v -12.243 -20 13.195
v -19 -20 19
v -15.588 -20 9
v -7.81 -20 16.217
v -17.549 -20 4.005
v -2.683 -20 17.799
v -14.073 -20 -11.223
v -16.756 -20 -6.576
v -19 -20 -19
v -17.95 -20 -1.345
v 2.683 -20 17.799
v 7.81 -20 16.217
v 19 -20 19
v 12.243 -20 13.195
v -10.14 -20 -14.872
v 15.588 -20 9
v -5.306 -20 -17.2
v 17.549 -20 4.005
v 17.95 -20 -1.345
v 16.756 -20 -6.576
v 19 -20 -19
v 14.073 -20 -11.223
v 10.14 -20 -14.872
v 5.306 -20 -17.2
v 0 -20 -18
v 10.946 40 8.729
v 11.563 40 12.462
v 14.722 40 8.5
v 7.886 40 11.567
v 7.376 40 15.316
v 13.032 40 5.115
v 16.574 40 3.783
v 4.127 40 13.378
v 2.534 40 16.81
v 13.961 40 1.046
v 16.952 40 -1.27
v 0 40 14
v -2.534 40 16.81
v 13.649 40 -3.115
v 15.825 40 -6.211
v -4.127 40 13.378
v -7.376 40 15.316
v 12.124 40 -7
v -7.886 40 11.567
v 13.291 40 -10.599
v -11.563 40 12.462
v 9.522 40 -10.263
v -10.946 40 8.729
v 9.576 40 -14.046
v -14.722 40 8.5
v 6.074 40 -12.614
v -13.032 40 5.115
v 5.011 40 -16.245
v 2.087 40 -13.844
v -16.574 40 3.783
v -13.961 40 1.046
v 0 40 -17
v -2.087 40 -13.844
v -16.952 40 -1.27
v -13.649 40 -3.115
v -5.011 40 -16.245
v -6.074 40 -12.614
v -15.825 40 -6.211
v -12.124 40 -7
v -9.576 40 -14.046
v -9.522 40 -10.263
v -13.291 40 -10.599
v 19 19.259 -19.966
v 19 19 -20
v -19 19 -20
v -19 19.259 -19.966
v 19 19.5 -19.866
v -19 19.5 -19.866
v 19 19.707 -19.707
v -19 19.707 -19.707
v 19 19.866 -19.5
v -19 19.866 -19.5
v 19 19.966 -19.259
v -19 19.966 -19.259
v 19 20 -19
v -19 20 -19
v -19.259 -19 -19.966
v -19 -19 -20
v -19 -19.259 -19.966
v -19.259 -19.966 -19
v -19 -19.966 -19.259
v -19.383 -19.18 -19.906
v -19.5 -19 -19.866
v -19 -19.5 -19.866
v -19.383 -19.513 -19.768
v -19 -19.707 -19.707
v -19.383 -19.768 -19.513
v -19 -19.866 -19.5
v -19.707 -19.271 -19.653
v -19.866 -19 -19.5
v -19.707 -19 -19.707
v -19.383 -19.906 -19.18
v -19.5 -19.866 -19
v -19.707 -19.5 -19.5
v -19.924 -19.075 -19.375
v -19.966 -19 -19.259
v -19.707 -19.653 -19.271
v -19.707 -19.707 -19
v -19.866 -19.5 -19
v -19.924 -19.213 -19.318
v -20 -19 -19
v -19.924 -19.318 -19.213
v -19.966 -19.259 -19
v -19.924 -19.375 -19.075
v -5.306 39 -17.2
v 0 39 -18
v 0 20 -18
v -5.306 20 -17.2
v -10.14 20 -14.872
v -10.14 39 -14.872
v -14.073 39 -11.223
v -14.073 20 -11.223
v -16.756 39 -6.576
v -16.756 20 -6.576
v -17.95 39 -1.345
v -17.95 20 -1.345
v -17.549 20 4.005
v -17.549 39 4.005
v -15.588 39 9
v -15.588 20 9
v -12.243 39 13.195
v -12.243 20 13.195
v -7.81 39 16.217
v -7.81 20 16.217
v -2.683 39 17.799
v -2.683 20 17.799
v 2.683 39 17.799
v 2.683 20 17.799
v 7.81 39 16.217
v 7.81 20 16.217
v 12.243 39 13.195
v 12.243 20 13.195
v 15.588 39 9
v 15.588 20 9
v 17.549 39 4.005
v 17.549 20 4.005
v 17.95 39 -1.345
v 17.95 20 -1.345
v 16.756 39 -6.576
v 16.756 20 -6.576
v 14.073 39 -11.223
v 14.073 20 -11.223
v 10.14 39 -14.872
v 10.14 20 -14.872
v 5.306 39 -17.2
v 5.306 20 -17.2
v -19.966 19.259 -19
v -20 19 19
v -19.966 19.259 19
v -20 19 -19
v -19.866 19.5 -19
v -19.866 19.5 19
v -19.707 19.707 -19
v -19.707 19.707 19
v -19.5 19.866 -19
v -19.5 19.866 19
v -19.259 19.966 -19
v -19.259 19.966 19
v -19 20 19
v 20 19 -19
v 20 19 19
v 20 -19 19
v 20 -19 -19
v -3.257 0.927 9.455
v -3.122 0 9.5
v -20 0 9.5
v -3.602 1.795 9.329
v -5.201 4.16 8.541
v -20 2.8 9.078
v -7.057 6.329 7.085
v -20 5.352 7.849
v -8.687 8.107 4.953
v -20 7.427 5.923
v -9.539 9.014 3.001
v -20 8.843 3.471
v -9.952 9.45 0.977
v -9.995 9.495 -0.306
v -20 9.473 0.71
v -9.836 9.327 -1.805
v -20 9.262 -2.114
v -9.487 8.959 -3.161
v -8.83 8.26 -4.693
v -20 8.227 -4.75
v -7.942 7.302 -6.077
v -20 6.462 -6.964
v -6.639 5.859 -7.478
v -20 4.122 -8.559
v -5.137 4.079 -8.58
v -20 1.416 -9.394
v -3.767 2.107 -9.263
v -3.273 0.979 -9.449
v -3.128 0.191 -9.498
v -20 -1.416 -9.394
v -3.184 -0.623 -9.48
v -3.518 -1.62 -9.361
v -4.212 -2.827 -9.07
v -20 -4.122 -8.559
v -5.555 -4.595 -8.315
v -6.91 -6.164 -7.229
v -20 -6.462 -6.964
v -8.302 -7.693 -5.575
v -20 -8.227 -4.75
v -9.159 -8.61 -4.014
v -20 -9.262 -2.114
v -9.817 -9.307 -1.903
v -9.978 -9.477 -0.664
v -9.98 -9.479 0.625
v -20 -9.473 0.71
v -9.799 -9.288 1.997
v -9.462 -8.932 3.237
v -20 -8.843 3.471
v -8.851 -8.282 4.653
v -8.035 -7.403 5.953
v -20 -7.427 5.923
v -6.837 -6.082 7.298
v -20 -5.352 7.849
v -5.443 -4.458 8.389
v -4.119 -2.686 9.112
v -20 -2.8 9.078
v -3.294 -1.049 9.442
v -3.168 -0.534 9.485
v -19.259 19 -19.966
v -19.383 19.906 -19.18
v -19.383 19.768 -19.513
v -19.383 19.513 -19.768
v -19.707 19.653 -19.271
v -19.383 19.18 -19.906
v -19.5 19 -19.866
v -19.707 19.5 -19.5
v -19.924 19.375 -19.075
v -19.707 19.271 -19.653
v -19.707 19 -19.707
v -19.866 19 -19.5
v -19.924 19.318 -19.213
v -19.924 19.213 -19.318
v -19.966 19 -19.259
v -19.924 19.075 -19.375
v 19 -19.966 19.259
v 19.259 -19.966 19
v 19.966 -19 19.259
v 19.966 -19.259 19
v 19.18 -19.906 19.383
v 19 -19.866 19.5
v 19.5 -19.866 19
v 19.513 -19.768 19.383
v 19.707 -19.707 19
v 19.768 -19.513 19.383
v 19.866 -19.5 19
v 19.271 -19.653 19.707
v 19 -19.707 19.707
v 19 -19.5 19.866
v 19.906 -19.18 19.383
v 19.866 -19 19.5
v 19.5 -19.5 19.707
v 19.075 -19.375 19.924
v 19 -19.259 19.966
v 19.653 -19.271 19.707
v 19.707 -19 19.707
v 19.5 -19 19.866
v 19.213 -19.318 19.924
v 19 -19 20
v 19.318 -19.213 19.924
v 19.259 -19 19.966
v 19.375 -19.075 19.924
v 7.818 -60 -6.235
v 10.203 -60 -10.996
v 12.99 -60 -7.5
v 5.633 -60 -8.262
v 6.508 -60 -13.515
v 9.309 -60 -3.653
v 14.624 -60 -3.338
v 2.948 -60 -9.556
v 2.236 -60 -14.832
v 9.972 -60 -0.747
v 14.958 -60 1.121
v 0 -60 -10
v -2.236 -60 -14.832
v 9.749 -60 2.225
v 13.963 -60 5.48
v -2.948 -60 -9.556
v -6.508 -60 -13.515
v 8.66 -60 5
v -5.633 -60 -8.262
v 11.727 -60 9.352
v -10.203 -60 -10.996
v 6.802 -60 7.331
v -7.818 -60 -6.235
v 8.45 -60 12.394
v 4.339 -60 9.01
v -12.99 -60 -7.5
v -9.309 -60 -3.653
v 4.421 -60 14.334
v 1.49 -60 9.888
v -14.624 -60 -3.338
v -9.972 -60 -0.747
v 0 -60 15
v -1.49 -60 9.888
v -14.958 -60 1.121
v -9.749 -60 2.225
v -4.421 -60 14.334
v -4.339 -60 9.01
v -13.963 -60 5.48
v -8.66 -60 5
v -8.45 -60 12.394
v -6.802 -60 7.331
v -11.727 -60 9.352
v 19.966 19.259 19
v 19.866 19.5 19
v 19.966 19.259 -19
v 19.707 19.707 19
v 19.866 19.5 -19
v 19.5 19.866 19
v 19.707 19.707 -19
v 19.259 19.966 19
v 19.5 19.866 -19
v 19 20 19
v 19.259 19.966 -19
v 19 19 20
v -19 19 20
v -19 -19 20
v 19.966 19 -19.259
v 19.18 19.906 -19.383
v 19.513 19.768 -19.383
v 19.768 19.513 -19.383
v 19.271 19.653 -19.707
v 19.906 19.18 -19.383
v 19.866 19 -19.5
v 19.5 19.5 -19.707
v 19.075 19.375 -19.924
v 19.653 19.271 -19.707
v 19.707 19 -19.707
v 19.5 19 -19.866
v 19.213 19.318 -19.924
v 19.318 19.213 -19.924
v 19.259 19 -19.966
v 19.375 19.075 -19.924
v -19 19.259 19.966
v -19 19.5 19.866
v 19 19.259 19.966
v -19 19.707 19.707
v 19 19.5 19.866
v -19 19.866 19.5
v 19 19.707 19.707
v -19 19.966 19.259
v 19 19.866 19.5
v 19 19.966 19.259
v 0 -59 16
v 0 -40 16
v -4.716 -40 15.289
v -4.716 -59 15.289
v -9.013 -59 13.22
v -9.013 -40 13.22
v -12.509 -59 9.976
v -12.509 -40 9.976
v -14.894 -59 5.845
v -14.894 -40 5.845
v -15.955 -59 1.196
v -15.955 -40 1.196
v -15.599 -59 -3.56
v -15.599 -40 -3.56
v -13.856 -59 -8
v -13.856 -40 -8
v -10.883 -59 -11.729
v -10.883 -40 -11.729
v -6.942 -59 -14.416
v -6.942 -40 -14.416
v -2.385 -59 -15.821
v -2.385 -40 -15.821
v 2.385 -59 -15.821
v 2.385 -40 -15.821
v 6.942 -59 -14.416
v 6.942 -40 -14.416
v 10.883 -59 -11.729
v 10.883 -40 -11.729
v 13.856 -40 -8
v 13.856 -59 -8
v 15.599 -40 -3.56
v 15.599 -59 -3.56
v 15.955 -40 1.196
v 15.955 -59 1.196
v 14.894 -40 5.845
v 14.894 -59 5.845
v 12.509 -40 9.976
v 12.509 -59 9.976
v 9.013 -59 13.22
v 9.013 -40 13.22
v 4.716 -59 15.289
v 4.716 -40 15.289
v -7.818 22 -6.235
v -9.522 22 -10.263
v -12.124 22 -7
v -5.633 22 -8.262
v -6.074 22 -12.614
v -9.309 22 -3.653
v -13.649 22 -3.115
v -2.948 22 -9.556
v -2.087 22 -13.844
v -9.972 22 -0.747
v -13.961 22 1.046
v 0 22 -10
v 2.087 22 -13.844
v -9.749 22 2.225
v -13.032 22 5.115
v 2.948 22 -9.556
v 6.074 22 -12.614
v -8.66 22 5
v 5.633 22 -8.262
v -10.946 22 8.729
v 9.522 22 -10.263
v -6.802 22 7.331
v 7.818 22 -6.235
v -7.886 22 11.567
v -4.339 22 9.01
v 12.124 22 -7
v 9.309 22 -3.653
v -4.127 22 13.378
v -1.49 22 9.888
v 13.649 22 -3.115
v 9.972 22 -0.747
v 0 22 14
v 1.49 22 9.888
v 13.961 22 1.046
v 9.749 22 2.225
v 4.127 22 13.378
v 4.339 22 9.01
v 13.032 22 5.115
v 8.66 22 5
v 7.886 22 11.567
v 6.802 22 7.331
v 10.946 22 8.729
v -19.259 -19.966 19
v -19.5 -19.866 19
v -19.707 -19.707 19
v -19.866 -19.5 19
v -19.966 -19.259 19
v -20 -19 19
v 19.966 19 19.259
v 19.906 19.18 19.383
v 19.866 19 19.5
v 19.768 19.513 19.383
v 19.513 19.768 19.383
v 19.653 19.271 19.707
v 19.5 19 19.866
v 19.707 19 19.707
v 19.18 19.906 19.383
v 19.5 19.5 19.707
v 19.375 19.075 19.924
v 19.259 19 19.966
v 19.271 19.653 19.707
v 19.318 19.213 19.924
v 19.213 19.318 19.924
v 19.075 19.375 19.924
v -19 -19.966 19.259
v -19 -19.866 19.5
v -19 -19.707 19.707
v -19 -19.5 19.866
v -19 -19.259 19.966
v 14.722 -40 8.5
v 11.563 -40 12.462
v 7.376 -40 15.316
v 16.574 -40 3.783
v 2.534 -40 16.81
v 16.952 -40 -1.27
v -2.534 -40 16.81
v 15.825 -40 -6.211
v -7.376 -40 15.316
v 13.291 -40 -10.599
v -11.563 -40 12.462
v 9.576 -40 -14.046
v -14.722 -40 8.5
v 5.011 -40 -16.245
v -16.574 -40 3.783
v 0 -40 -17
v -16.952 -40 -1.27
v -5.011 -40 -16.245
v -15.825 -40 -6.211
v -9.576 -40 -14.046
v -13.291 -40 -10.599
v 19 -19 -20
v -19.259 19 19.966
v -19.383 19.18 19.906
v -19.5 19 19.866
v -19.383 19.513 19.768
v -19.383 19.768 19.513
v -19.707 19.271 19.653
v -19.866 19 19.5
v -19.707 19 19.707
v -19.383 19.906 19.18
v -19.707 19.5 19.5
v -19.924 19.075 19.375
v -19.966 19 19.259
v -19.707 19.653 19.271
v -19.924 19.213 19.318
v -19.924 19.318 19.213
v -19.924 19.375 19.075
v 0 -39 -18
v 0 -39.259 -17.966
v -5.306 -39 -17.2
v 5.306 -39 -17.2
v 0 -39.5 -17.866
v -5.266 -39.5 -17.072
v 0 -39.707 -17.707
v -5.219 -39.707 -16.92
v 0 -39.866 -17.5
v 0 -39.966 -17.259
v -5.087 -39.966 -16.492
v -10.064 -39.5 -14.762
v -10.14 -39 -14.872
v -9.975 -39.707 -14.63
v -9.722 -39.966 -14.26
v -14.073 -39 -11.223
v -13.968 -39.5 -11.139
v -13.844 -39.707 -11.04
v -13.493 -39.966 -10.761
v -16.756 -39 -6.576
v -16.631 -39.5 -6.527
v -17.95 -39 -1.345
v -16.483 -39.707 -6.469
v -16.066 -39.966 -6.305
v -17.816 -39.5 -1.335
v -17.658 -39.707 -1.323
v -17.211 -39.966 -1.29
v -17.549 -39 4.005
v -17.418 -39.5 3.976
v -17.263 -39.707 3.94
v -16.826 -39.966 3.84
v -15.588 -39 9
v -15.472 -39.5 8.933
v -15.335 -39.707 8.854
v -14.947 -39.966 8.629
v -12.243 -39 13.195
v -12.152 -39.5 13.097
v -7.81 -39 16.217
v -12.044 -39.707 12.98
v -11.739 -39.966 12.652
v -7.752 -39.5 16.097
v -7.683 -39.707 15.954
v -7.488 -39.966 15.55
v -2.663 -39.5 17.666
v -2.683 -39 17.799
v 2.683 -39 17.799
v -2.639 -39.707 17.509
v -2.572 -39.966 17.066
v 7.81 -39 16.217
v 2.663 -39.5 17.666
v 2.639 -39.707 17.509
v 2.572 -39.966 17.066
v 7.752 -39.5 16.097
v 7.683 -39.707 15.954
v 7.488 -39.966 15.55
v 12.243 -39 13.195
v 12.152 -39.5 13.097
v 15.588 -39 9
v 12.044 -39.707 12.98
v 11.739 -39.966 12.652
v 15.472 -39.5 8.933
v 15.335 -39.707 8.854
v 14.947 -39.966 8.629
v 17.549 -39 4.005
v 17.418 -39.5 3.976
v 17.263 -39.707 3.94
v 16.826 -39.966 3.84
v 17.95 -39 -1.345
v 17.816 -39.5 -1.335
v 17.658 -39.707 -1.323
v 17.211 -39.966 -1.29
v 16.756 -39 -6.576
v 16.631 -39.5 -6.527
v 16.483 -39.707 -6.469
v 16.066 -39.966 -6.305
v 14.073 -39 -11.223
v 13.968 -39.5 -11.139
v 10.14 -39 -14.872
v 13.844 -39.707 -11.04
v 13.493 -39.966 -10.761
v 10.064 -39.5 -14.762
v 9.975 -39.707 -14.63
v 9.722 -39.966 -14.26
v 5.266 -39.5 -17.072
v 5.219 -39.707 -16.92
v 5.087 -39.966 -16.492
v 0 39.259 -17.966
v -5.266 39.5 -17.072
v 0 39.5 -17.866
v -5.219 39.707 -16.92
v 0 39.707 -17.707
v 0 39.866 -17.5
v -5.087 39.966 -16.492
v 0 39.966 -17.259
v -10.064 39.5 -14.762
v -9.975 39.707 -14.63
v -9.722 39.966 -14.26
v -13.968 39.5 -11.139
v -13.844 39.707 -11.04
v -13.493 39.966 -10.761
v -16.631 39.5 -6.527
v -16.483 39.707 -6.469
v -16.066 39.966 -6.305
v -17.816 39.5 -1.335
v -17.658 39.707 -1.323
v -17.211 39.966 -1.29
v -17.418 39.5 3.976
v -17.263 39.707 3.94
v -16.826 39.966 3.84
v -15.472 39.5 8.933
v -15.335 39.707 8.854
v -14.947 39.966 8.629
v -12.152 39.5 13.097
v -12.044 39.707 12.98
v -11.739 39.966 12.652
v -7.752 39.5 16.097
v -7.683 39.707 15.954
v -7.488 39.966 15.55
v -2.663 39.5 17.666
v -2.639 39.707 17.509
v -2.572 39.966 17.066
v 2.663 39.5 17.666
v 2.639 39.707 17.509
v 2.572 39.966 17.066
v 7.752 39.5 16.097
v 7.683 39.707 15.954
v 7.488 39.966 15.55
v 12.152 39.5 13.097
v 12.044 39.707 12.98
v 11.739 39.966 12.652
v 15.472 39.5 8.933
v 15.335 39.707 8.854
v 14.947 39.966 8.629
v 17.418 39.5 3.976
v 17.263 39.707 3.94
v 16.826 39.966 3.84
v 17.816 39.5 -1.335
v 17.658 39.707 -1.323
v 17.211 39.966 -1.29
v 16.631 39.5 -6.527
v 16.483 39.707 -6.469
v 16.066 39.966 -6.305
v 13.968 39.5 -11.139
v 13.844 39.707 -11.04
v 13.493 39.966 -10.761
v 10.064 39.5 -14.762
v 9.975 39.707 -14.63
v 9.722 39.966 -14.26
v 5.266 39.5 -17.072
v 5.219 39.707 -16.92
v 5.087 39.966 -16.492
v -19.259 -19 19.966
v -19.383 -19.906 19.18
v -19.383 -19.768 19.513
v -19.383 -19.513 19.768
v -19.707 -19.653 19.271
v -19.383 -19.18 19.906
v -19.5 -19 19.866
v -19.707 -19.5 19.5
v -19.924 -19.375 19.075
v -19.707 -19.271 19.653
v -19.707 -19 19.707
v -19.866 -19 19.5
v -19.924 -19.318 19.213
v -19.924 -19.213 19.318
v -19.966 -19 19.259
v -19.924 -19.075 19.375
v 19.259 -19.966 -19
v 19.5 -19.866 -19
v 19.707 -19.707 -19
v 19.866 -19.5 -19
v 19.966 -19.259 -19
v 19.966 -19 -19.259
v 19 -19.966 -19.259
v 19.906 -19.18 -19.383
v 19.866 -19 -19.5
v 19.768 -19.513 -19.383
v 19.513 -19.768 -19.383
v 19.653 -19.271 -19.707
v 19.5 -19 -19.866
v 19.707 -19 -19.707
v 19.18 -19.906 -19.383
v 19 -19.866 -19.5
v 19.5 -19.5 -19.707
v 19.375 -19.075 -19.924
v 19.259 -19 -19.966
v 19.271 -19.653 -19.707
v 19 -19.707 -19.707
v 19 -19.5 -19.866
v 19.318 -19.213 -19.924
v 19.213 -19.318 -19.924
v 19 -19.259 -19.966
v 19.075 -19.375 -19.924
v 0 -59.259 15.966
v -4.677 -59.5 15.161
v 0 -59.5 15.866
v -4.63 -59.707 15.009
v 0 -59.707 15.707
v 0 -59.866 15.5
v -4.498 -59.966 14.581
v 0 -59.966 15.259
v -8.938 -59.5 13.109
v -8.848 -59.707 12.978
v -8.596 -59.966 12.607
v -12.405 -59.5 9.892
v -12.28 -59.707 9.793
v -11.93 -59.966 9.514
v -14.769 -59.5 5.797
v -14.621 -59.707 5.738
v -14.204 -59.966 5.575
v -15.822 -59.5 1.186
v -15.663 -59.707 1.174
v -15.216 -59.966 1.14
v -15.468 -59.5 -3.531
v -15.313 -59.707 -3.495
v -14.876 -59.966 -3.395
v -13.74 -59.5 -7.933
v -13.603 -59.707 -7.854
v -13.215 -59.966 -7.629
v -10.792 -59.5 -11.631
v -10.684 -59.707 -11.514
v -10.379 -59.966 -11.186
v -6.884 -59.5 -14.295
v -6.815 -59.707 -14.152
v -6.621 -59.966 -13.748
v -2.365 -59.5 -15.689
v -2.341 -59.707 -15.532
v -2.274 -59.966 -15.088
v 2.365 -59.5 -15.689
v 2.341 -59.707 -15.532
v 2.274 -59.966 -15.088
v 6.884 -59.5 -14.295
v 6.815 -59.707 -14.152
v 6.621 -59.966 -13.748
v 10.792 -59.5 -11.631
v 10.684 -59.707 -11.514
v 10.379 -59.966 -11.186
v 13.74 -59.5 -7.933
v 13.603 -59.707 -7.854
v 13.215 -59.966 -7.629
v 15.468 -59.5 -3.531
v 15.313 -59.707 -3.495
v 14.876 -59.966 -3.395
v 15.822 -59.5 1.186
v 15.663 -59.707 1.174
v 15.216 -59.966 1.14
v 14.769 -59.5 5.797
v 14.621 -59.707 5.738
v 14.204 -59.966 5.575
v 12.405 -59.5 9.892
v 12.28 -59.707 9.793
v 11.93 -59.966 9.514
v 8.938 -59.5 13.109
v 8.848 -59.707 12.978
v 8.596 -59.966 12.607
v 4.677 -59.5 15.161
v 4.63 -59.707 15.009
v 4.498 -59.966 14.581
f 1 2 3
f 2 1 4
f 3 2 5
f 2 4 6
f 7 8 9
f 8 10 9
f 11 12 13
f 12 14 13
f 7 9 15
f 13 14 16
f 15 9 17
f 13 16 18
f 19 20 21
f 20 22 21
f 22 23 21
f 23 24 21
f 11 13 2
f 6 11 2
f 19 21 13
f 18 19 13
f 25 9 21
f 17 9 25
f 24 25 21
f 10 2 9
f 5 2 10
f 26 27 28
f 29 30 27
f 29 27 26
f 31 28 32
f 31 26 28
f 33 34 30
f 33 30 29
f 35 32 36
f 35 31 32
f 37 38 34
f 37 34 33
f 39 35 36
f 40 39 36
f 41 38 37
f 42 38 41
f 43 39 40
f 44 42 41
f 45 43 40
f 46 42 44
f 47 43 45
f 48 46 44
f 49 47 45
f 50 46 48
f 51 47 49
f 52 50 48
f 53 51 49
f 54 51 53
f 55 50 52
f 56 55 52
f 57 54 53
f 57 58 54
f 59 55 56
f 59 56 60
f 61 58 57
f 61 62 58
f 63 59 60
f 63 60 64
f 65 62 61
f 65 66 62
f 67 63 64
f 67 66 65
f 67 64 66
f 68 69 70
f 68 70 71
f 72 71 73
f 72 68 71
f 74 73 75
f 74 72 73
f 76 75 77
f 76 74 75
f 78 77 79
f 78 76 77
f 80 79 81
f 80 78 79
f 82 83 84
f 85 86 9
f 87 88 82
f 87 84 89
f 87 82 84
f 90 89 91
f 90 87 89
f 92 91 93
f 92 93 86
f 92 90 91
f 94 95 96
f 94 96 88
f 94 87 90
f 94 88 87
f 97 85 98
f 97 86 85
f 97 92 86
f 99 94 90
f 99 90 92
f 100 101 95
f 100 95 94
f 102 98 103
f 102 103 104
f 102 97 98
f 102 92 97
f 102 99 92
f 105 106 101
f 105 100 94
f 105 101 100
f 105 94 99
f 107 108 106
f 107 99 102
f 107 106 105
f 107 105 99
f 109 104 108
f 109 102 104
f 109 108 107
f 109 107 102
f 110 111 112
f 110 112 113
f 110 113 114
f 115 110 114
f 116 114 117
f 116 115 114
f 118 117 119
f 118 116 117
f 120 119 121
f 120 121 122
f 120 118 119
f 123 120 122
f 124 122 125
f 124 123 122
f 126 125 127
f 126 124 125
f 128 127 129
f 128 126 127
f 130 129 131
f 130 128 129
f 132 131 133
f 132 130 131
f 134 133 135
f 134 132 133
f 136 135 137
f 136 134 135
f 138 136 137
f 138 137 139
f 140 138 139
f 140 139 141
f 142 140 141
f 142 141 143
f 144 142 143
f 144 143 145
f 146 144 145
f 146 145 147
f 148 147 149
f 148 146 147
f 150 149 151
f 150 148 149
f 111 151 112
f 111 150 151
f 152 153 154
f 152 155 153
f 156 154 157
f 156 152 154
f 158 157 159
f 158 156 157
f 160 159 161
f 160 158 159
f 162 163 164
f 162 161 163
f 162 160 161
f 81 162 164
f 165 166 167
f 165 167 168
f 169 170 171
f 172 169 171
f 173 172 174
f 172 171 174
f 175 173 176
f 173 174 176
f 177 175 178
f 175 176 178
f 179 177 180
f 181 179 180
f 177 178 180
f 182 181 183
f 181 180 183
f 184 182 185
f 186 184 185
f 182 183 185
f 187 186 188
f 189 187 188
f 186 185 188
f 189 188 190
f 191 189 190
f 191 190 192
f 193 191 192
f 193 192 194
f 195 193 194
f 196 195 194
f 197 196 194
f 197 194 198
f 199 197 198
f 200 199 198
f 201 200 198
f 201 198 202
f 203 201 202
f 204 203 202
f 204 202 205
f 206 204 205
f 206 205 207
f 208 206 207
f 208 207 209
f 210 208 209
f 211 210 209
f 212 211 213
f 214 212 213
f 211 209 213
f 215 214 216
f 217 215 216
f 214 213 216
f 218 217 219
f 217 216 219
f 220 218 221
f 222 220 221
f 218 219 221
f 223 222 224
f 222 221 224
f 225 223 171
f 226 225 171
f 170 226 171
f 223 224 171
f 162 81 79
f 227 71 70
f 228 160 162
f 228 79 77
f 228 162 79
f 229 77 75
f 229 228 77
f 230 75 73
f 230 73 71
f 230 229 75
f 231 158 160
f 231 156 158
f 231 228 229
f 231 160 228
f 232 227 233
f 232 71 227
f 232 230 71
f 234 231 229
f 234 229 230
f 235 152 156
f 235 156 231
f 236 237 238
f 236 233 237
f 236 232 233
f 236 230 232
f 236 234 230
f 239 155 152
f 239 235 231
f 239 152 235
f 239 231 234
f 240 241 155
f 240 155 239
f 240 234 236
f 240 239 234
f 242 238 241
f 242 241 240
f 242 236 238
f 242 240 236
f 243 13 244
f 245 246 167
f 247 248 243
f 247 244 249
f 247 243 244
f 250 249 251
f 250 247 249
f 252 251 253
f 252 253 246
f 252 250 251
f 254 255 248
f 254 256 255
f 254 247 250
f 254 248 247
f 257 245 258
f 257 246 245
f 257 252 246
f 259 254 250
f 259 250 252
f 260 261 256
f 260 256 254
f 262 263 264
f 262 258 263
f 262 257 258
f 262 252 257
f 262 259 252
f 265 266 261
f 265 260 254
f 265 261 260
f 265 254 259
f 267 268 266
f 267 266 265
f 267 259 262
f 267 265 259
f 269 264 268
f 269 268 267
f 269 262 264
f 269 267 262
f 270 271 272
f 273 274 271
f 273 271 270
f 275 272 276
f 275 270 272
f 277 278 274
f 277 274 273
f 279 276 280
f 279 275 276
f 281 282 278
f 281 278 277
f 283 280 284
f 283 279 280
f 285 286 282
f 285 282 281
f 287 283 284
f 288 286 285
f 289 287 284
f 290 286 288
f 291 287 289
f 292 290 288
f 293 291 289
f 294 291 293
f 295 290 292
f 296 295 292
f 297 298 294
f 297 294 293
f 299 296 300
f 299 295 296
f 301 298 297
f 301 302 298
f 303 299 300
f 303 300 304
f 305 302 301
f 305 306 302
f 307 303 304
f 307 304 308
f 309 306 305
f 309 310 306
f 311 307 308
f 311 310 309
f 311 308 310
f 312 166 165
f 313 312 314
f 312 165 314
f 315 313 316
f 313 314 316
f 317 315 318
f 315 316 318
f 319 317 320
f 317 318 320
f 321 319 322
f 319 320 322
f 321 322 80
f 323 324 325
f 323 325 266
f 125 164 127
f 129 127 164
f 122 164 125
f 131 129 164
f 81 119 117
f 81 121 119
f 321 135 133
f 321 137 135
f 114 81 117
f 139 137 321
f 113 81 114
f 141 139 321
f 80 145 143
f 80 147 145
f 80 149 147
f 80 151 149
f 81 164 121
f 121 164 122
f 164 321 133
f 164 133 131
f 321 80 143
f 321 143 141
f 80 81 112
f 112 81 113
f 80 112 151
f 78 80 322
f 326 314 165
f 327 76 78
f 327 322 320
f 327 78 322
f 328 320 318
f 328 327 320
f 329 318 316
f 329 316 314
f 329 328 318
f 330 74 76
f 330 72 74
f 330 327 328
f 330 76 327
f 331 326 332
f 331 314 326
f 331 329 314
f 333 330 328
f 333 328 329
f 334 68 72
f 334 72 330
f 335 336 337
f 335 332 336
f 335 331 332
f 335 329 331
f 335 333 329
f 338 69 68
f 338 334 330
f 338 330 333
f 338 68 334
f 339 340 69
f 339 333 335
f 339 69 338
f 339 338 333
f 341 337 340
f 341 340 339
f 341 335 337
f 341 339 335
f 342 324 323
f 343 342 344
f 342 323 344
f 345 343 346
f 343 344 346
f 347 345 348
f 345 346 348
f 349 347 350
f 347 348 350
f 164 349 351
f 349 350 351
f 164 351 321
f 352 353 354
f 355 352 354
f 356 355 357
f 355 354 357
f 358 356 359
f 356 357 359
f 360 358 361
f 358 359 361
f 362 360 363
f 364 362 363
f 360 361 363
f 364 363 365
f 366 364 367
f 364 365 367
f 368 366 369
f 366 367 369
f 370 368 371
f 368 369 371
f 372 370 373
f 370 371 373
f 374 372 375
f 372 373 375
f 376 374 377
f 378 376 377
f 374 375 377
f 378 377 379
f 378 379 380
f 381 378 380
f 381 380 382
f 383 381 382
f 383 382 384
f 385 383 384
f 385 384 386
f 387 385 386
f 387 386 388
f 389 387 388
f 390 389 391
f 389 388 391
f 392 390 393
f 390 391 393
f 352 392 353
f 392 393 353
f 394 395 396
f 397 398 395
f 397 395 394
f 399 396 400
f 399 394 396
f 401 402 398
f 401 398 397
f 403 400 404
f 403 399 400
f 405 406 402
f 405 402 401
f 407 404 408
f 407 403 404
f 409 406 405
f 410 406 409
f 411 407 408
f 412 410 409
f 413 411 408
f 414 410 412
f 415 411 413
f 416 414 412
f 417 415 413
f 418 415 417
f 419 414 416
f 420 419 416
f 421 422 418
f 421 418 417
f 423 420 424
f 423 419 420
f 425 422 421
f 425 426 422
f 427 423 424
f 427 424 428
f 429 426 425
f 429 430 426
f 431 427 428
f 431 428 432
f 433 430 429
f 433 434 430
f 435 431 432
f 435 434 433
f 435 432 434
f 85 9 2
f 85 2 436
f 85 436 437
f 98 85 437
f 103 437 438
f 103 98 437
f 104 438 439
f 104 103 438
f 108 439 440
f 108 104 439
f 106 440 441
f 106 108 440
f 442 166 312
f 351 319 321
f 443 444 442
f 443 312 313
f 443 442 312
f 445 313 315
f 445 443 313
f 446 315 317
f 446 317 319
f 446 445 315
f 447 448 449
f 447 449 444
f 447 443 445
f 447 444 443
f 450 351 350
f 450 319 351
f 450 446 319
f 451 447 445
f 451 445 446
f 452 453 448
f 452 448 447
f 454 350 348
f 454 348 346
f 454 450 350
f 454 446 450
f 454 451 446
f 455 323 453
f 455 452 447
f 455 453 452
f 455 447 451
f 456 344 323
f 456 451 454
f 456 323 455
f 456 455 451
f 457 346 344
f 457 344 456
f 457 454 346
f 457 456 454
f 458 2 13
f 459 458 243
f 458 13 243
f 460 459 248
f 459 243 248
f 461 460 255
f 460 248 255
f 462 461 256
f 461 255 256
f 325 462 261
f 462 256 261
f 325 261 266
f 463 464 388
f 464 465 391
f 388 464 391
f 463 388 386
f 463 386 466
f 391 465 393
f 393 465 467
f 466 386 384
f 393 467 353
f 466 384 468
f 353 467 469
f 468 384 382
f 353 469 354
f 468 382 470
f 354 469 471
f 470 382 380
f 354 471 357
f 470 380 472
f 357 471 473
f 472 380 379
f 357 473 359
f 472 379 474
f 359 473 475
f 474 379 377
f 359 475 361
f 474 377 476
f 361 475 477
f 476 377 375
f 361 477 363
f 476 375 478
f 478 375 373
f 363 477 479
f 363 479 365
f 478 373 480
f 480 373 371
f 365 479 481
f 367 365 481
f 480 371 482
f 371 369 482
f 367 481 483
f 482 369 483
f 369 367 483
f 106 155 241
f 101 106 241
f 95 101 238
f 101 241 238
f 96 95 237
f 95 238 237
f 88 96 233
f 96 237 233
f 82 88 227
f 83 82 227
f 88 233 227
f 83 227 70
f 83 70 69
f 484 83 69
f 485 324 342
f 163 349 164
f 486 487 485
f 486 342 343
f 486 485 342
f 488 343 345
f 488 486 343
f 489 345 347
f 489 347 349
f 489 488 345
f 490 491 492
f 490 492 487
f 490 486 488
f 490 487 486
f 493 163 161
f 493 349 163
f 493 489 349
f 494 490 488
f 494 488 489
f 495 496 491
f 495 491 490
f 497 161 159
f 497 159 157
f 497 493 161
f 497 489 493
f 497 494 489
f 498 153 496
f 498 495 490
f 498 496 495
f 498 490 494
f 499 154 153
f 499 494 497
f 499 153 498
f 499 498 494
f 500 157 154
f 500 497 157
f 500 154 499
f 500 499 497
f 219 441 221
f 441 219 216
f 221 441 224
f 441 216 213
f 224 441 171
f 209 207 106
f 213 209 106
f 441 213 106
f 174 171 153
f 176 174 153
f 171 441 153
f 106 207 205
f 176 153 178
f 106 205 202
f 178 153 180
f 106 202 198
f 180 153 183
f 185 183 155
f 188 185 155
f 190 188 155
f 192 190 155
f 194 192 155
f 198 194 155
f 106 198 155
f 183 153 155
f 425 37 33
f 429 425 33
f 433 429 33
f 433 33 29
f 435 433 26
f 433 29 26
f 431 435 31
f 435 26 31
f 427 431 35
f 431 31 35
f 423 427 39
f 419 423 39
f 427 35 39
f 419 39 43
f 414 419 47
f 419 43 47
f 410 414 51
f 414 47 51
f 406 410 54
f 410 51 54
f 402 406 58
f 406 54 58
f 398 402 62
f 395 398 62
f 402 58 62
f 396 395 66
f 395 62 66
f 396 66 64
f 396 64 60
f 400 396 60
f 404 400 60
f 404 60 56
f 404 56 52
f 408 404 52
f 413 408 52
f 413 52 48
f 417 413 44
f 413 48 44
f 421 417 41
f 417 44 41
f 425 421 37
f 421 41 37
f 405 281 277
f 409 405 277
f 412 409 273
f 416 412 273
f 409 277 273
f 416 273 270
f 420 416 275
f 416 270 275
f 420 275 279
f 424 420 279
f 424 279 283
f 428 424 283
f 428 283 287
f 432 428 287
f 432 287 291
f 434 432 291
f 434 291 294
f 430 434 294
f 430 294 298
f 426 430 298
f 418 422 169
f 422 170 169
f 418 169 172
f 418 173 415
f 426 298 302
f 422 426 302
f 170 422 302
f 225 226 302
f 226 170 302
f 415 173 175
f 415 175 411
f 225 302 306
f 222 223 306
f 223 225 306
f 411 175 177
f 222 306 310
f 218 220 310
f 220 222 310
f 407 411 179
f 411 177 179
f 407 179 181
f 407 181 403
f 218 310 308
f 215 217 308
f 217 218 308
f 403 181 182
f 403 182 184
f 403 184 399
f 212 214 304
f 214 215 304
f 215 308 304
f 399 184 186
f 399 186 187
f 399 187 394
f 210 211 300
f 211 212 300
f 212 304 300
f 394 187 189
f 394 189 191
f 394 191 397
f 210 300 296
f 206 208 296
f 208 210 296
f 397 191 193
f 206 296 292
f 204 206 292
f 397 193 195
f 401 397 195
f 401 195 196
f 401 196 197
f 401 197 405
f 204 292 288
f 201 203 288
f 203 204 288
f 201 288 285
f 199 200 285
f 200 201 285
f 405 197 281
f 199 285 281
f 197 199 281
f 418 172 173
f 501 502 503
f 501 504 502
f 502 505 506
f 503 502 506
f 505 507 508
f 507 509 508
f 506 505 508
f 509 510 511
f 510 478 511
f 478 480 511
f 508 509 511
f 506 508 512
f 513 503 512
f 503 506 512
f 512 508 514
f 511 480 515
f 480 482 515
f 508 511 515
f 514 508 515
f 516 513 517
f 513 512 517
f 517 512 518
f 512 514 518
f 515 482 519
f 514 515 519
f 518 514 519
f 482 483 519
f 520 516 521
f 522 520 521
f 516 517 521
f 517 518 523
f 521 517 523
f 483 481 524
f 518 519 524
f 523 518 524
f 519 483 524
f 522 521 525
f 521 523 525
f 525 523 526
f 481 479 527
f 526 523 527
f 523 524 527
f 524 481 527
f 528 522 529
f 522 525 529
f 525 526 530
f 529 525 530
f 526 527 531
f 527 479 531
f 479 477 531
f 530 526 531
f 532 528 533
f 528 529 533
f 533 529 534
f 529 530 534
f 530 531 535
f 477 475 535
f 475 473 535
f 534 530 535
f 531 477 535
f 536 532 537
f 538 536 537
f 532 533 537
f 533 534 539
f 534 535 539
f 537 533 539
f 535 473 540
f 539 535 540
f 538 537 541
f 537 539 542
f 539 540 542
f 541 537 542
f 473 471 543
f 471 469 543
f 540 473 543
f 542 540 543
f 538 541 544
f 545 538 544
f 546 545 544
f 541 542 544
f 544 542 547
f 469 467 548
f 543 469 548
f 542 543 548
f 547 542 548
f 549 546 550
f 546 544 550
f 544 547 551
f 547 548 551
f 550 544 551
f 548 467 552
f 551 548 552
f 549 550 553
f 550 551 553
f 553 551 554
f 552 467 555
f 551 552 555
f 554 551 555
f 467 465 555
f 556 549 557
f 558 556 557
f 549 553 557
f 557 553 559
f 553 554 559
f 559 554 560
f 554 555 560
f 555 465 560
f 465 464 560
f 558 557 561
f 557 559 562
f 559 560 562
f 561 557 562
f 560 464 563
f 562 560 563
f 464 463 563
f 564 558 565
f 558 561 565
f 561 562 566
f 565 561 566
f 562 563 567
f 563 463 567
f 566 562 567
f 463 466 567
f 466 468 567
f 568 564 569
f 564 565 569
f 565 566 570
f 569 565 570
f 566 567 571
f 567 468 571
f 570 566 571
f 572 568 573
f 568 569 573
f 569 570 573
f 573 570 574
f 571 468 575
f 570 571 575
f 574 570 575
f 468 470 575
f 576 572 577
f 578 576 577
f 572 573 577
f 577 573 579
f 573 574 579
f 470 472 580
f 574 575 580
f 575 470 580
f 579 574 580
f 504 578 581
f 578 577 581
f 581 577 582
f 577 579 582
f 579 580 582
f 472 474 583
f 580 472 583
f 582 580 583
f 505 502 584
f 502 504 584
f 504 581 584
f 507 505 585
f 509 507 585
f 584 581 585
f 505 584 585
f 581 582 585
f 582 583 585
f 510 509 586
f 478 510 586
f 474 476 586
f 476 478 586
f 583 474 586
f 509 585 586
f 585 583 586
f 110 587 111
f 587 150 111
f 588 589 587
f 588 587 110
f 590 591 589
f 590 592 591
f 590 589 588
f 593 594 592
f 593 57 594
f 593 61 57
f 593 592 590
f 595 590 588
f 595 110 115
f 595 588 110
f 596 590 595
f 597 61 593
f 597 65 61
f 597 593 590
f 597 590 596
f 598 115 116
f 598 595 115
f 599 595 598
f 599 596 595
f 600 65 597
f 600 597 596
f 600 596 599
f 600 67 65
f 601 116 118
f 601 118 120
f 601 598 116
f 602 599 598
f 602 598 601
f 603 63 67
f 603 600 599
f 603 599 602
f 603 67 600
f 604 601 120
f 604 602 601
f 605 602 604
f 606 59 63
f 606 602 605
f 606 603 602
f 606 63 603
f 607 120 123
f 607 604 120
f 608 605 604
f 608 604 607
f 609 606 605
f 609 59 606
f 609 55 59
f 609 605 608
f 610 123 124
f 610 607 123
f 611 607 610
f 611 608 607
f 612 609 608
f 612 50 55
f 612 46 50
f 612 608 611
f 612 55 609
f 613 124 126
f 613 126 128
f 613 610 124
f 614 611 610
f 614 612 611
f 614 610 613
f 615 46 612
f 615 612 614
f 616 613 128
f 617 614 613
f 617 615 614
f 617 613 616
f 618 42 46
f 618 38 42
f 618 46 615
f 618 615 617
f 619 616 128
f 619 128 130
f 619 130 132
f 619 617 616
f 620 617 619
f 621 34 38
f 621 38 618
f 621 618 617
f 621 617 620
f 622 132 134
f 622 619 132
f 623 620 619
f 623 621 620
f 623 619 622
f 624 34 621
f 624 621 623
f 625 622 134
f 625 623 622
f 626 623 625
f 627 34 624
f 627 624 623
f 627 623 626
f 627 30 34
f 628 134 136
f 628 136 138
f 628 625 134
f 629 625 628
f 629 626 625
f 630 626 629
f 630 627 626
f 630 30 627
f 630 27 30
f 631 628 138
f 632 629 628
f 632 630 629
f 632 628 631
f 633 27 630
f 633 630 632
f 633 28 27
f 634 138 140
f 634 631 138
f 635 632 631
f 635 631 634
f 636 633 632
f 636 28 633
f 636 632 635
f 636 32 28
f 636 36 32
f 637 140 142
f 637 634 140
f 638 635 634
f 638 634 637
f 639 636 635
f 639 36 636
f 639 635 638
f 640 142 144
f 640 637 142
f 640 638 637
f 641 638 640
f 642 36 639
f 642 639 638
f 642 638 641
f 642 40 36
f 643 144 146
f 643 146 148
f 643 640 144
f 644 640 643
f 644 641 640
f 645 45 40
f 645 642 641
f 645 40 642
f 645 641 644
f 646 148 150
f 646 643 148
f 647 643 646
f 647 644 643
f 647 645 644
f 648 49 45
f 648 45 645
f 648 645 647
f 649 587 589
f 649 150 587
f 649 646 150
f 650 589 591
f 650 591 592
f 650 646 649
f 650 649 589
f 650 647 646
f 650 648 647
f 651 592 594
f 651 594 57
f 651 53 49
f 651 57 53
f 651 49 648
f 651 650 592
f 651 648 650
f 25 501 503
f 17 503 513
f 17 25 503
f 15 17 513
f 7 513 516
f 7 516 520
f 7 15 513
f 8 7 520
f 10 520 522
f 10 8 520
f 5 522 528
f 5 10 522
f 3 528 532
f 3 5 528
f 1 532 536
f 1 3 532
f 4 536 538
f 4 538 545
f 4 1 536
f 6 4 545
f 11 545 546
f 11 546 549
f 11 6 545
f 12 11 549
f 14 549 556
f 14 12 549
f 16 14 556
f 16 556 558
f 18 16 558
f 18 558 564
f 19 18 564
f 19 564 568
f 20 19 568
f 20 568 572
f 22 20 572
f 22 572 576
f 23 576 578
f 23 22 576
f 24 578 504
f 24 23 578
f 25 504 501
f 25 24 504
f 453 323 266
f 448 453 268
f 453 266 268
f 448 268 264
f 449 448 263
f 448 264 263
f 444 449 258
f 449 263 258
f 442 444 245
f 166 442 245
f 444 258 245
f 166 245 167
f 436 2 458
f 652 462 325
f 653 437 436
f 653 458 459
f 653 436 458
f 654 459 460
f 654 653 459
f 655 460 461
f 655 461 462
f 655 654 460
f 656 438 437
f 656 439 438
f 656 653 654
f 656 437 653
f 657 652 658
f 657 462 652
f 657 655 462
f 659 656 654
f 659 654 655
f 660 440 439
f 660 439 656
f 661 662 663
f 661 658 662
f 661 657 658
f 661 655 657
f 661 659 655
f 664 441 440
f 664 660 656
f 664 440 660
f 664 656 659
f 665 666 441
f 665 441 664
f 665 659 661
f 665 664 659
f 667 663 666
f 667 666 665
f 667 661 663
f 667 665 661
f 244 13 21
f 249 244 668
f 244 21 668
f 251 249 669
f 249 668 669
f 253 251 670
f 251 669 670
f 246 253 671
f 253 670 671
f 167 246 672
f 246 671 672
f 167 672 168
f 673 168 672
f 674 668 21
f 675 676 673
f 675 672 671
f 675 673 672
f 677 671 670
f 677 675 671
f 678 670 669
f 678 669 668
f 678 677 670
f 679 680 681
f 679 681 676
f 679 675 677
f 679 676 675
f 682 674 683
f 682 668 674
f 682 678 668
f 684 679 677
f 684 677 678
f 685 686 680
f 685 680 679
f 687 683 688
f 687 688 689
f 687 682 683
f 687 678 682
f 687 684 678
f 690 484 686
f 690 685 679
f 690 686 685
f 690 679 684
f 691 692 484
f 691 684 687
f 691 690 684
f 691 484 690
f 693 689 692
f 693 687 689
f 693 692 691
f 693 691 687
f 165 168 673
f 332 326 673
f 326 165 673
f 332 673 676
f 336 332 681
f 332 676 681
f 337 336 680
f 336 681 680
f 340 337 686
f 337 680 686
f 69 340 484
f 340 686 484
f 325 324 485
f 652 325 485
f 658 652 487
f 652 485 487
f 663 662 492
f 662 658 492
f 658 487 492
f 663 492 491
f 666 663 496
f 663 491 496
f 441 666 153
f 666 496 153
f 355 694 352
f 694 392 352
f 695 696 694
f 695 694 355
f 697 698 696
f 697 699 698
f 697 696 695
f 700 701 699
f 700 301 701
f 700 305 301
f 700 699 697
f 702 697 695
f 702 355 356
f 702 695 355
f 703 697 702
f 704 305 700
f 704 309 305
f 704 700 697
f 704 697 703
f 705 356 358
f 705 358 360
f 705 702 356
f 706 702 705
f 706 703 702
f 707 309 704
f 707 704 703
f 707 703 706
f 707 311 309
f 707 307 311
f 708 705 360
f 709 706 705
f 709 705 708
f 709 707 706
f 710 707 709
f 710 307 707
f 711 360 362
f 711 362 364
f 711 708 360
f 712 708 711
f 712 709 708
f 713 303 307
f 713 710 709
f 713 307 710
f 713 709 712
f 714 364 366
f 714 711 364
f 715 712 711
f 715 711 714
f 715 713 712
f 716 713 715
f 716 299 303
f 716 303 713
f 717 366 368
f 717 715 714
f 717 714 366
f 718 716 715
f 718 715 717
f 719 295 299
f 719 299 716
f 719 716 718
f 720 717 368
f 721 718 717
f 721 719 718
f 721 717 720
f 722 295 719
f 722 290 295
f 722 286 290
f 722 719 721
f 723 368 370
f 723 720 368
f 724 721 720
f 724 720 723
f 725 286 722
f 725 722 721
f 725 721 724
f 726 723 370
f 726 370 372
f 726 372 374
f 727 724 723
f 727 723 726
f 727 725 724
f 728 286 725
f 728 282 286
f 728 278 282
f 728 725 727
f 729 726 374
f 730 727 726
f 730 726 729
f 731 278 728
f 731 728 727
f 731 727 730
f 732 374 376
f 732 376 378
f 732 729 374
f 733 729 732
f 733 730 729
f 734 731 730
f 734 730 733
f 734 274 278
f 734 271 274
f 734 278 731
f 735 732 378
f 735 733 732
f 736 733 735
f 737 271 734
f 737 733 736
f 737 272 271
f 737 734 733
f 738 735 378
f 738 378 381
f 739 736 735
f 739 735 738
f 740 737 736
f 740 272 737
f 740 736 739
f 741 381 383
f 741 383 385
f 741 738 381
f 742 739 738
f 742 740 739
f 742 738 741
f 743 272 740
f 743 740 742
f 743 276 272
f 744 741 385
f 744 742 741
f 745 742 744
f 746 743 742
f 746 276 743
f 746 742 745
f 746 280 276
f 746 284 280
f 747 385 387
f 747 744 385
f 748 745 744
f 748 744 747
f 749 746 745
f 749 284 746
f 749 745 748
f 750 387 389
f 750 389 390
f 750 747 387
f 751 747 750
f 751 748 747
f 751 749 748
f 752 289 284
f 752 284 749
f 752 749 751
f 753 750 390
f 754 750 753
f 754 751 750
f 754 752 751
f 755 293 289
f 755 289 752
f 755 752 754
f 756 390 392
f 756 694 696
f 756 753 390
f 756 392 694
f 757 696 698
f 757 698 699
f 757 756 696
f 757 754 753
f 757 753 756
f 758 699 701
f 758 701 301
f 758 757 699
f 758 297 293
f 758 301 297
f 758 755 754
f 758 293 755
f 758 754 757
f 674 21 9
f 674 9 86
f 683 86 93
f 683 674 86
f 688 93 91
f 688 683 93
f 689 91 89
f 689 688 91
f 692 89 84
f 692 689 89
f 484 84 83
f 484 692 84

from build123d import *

# Parameters (mm, degrees)
CROQUIS1_W              = 40
CROQUIS1_H              = 40
SALIENTE_EXTRUIR2_DEPTH = 20
CROQUIS4_R              = 18
SALIENTE_EXTRUIR3_DEPTH = 40
REDONDEO1_R             = 1
CROQUIS5_R              = 16
SALIENTE_EXTRUIR4_DEPTH = 20
REDONDEO2_R             = 1
CROQUIS6_R              = 14
CORTAR_EXTRUIR1_DEPTH   = 18
CROQUIS7_R              = 10
CORTAR_EXTRUIR3_DEPTH   = 104.923048454
CROQUIS8_R              = 9.5
CORTAR_EXTRUIR4_DEPTH   = 18
REDONDEO3_R             = 1


with BuildPart() as part:
    # Croquis1 → Saliente-Extruir2 (new, symmetric)
    with BuildSketch(Plane(origin=(0, 0, 0), x_dir=(1, 0, 0), z_dir=(0, 1, 0))):
        Rectangle(CROQUIS1_W, CROQUIS1_H)
    extrude(amount=SALIENTE_EXTRUIR2_DEPTH, both=True)

    # Croquis4 → Saliente-Extruir3 (add, symmetric)
    with BuildSketch(Plane(origin=(0, 0, 0), x_dir=(1, 0, 0), z_dir=(0, 1, 0))):
        with Locations(Location((0, 0, 0), (0, 0, 90))):
            Circle(CROQUIS4_R)
    extrude(amount=SALIENTE_EXTRUIR3_DEPTH, both=True)

    # Redondeo1
    redondeo1_edges = [part.edges().sort_by_distance(p)[0] for p in [
        (-20, 20, 0),
        (0, 20, 20),
        (0, -40, 18),
        (0, 40, 18),
        (20, 20, 0),
        (0, -20, 20),
        (-20, -20, 0),
        (0, -20, -20),
        (20, -20, 0),
        (0, 20, -20),
    ]]
    fillet(redondeo1_edges, radius=REDONDEO1_R)

    # Croquis5 → Saliente-Extruir4 (add)
    with BuildSketch(Plane.XZ.offset(40)):
        with Locations(Location((0, 0, 0), (0, 0, 90))):
            Circle(CROQUIS5_R)
    extrude(amount=SALIENTE_EXTRUIR4_DEPTH)

    # Redondeo2
    redondeo2_edges = [part.edges().sort_by_distance(p)[0] for p in [
        (0, -60, -16),
    ]]
    fillet(redondeo2_edges, radius=REDONDEO2_R)

    # Croquis6 → Cortar-Extruir1 (cut)
    with BuildSketch(Plane(origin=(0, 40, 0), x_dir=(1, 0, 0), z_dir=(0, 1, 0))):
        with Locations(Location((0, 0, 0), (0, 0, 270))):
            Circle(CROQUIS6_R)
    extrude(amount=-CORTAR_EXTRUIR1_DEPTH, mode=Mode.SUBTRACT)

    # Croquis7 → Cortar-Extruir3 (cut, through all)
    with BuildSketch(Plane.XZ.offset(60)):
        with Locations(Location((0, 0, 0), (0, 0, 270))):
            Circle(CROQUIS7_R)
    extrude(amount=-CORTAR_EXTRUIR3_DEPTH, mode=Mode.SUBTRACT)

    # Croquis8 → Cortar-Extruir4 (cut)
    with BuildSketch(Plane.ZY.offset(20)):
        Circle(CROQUIS8_R)
    extrude(amount=-CORTAR_EXTRUIR4_DEPTH, mode=Mode.SUBTRACT)

    # Redondeo3
    # the kernel refuses this fillet: 1 mm, written as the material it takes off along each edge
    with BuildSketch(Plane(origin=(19, -19, 19), x_dir=(1, 0, 0), z_dir=(0, 0, 1))) as redondeo3_piece_1_section:
        Polygon((0, 0), (REDONDEO3_R, 0), (REDONDEO3_R, -REDONDEO3_R), (0, -REDONDEO3_R), align=None)
    redondeo3_piece_1 = extrude(amount=REDONDEO3_R, mode=Mode.PRIVATE)
    redondeo3_piece_1 = redondeo3_piece_1 - Plane(origin=(19, -19, 19), x_dir=(-0.7071067811865475, 0.7071067811865475, 0), z_dir=(0, 0, 1)) * Sphere(REDONDEO3_R, mode=Mode.PRIVATE)
    add(redondeo3_piece_1, mode=Mode.SUBTRACT)
    with BuildSketch(Plane(origin=(-19, -19, 19), x_dir=(0, 0, 1), z_dir=(-1, 0, 0))) as redondeo3_piece_2_section:
        Polygon((0, 0), (REDONDEO3_R, 0), (REDONDEO3_R, -REDONDEO3_R), (0, -REDONDEO3_R), align=None)
    redondeo3_piece_2 = extrude(amount=REDONDEO3_R, mode=Mode.PRIVATE)
    redondeo3_piece_2 = redondeo3_piece_2 - Plane(origin=(-19, -19, 19), x_dir=(0, 0.7071067811865475, -0.7071067811865475), z_dir=(-1, 0, 0)) * Sphere(REDONDEO3_R, mode=Mode.PRIVATE)
    add(redondeo3_piece_2, mode=Mode.SUBTRACT)
    with BuildSketch(Plane(origin=(19, -19, -19), x_dir=(1, 0, 0), z_dir=(0, 0, -1))) as redondeo3_piece_3_section:
        Polygon((0, 0), (REDONDEO3_R, 0), (REDONDEO3_R, REDONDEO3_R), (0, REDONDEO3_R), align=None)
    redondeo3_piece_3 = extrude(amount=REDONDEO3_R, mode=Mode.PRIVATE)
    redondeo3_piece_3 = redondeo3_piece_3 - Plane(origin=(19, -19, -19), x_dir=(-0.7071067811865475, 0.7071067811865475, 0), z_dir=(0, 0, -1)) * Sphere(REDONDEO3_R, mode=Mode.PRIVATE)
    add(redondeo3_piece_3, mode=Mode.SUBTRACT)
    with BuildSketch(Plane(origin=(-19, -19, -19), x_dir=(0, 0, -1), z_dir=(-1, 0, 0))) as redondeo3_piece_4_section:
        Polygon((0, 0), (REDONDEO3_R, 0), (REDONDEO3_R, REDONDEO3_R), (0, REDONDEO3_R), align=None)
    redondeo3_piece_4 = extrude(amount=REDONDEO3_R, mode=Mode.PRIVATE)
    redondeo3_piece_4 = redondeo3_piece_4 - Plane(origin=(-19, -19, -19), x_dir=(0, 0.7071067811865475, 0.7071067811865475), z_dir=(-1, 0, 0)) * Sphere(REDONDEO3_R, mode=Mode.PRIVATE)
    add(redondeo3_piece_4, mode=Mode.SUBTRACT)
    with BuildSketch(Plane(origin=(19, 19, 19), x_dir=(1, 0, 0), z_dir=(0, 0, 1))) as redondeo3_piece_5_section:
        Polygon((0, 0), (REDONDEO3_R, 0), (REDONDEO3_R, REDONDEO3_R), (0, REDONDEO3_R), align=None)
    redondeo3_piece_5 = extrude(amount=REDONDEO3_R, mode=Mode.PRIVATE)
    redondeo3_piece_5 = redondeo3_piece_5 - Plane(origin=(19, 19, 19), x_dir=(-0.7071067811865475, -0.7071067811865475, 0), z_dir=(0, 0, 1)) * Sphere(REDONDEO3_R, mode=Mode.PRIVATE)
    add(redondeo3_piece_5, mode=Mode.SUBTRACT)
    with BuildSketch(Plane(origin=(-19, 19, 19), x_dir=(0, 0, 1), z_dir=(-1, 0, 0))) as redondeo3_piece_6_section:
        Polygon((0, 0), (REDONDEO3_R, 0), (REDONDEO3_R, REDONDEO3_R), (0, REDONDEO3_R), align=None)
    redondeo3_piece_6 = extrude(amount=REDONDEO3_R, mode=Mode.PRIVATE)
    redondeo3_piece_6 = redondeo3_piece_6 - Plane(origin=(-19, 19, 19), x_dir=(0, -0.7071067811865475, -0.7071067811865475), z_dir=(-1, 0, 0)) * Sphere(REDONDEO3_R, mode=Mode.PRIVATE)
    add(redondeo3_piece_6, mode=Mode.SUBTRACT)
    with BuildSketch(Plane(origin=(19, 19, -19), x_dir=(1, 0, 0), z_dir=(0, 0, -1))) as redondeo3_piece_7_section:
        Polygon((0, 0), (REDONDEO3_R, 0), (REDONDEO3_R, -REDONDEO3_R), (0, -REDONDEO3_R), align=None)
    redondeo3_piece_7 = extrude(amount=REDONDEO3_R, mode=Mode.PRIVATE)
    redondeo3_piece_7 = redondeo3_piece_7 - Plane(origin=(19, 19, -19), x_dir=(-0.7071067811865475, -0.7071067811865475, 0), z_dir=(0, 0, -1)) * Sphere(REDONDEO3_R, mode=Mode.PRIVATE)
    add(redondeo3_piece_7, mode=Mode.SUBTRACT)
    with BuildSketch(Plane(origin=(-19, 19, -19), x_dir=(0, 0, -1), z_dir=(-1, 0, 0))) as redondeo3_piece_8_section:
        Polygon((0, 0), (REDONDEO3_R, 0), (REDONDEO3_R, -REDONDEO3_R), (0, -REDONDEO3_R), align=None)
    redondeo3_piece_8 = extrude(amount=REDONDEO3_R, mode=Mode.PRIVATE)
    redondeo3_piece_8 = redondeo3_piece_8 - Plane(origin=(-19, 19, -19), x_dir=(0, -0.7071067811865475, 0.7071067811865475), z_dir=(-1, 0, 0)) * Sphere(REDONDEO3_R, mode=Mode.PRIVATE)
    add(redondeo3_piece_8, mode=Mode.SUBTRACT)
    with BuildSketch(Plane(origin=(-20, 19, -20), x_dir=(0, 0, 1), z_dir=(0, -1, 0)), Plane(origin=(20, -19, 20), x_dir=(-1, 0, 0), z_dir=(0, 1, 0))) as redondeo3_piece_9:
        with BuildLine():
            CenterArc((REDONDEO3_R, -REDONDEO3_R), REDONDEO3_R, 90, 90)
            Line((0, -REDONDEO3_R), (0, 0))
            Line((0, 0), (REDONDEO3_R, 0))
        make_face()
    extrude(amount=38, mode=Mode.SUBTRACT)
    with BuildSketch(Plane(origin=(20, -19, -20), x_dir=(-1, 0, 0), z_dir=(0, 1, 0)), Plane(origin=(-20, 19, 20), x_dir=(0, 0, -1), z_dir=(0, -1, 0))) as redondeo3_piece_10:
        with BuildLine():
            CenterArc((REDONDEO3_R, REDONDEO3_R), REDONDEO3_R, 180, 90)
            Line((0, REDONDEO3_R), (0, 0))
            Line((0, 0), (REDONDEO3_R, 0))
        make_face()
    extrude(amount=38, mode=Mode.SUBTRACT)


solid = part.part
